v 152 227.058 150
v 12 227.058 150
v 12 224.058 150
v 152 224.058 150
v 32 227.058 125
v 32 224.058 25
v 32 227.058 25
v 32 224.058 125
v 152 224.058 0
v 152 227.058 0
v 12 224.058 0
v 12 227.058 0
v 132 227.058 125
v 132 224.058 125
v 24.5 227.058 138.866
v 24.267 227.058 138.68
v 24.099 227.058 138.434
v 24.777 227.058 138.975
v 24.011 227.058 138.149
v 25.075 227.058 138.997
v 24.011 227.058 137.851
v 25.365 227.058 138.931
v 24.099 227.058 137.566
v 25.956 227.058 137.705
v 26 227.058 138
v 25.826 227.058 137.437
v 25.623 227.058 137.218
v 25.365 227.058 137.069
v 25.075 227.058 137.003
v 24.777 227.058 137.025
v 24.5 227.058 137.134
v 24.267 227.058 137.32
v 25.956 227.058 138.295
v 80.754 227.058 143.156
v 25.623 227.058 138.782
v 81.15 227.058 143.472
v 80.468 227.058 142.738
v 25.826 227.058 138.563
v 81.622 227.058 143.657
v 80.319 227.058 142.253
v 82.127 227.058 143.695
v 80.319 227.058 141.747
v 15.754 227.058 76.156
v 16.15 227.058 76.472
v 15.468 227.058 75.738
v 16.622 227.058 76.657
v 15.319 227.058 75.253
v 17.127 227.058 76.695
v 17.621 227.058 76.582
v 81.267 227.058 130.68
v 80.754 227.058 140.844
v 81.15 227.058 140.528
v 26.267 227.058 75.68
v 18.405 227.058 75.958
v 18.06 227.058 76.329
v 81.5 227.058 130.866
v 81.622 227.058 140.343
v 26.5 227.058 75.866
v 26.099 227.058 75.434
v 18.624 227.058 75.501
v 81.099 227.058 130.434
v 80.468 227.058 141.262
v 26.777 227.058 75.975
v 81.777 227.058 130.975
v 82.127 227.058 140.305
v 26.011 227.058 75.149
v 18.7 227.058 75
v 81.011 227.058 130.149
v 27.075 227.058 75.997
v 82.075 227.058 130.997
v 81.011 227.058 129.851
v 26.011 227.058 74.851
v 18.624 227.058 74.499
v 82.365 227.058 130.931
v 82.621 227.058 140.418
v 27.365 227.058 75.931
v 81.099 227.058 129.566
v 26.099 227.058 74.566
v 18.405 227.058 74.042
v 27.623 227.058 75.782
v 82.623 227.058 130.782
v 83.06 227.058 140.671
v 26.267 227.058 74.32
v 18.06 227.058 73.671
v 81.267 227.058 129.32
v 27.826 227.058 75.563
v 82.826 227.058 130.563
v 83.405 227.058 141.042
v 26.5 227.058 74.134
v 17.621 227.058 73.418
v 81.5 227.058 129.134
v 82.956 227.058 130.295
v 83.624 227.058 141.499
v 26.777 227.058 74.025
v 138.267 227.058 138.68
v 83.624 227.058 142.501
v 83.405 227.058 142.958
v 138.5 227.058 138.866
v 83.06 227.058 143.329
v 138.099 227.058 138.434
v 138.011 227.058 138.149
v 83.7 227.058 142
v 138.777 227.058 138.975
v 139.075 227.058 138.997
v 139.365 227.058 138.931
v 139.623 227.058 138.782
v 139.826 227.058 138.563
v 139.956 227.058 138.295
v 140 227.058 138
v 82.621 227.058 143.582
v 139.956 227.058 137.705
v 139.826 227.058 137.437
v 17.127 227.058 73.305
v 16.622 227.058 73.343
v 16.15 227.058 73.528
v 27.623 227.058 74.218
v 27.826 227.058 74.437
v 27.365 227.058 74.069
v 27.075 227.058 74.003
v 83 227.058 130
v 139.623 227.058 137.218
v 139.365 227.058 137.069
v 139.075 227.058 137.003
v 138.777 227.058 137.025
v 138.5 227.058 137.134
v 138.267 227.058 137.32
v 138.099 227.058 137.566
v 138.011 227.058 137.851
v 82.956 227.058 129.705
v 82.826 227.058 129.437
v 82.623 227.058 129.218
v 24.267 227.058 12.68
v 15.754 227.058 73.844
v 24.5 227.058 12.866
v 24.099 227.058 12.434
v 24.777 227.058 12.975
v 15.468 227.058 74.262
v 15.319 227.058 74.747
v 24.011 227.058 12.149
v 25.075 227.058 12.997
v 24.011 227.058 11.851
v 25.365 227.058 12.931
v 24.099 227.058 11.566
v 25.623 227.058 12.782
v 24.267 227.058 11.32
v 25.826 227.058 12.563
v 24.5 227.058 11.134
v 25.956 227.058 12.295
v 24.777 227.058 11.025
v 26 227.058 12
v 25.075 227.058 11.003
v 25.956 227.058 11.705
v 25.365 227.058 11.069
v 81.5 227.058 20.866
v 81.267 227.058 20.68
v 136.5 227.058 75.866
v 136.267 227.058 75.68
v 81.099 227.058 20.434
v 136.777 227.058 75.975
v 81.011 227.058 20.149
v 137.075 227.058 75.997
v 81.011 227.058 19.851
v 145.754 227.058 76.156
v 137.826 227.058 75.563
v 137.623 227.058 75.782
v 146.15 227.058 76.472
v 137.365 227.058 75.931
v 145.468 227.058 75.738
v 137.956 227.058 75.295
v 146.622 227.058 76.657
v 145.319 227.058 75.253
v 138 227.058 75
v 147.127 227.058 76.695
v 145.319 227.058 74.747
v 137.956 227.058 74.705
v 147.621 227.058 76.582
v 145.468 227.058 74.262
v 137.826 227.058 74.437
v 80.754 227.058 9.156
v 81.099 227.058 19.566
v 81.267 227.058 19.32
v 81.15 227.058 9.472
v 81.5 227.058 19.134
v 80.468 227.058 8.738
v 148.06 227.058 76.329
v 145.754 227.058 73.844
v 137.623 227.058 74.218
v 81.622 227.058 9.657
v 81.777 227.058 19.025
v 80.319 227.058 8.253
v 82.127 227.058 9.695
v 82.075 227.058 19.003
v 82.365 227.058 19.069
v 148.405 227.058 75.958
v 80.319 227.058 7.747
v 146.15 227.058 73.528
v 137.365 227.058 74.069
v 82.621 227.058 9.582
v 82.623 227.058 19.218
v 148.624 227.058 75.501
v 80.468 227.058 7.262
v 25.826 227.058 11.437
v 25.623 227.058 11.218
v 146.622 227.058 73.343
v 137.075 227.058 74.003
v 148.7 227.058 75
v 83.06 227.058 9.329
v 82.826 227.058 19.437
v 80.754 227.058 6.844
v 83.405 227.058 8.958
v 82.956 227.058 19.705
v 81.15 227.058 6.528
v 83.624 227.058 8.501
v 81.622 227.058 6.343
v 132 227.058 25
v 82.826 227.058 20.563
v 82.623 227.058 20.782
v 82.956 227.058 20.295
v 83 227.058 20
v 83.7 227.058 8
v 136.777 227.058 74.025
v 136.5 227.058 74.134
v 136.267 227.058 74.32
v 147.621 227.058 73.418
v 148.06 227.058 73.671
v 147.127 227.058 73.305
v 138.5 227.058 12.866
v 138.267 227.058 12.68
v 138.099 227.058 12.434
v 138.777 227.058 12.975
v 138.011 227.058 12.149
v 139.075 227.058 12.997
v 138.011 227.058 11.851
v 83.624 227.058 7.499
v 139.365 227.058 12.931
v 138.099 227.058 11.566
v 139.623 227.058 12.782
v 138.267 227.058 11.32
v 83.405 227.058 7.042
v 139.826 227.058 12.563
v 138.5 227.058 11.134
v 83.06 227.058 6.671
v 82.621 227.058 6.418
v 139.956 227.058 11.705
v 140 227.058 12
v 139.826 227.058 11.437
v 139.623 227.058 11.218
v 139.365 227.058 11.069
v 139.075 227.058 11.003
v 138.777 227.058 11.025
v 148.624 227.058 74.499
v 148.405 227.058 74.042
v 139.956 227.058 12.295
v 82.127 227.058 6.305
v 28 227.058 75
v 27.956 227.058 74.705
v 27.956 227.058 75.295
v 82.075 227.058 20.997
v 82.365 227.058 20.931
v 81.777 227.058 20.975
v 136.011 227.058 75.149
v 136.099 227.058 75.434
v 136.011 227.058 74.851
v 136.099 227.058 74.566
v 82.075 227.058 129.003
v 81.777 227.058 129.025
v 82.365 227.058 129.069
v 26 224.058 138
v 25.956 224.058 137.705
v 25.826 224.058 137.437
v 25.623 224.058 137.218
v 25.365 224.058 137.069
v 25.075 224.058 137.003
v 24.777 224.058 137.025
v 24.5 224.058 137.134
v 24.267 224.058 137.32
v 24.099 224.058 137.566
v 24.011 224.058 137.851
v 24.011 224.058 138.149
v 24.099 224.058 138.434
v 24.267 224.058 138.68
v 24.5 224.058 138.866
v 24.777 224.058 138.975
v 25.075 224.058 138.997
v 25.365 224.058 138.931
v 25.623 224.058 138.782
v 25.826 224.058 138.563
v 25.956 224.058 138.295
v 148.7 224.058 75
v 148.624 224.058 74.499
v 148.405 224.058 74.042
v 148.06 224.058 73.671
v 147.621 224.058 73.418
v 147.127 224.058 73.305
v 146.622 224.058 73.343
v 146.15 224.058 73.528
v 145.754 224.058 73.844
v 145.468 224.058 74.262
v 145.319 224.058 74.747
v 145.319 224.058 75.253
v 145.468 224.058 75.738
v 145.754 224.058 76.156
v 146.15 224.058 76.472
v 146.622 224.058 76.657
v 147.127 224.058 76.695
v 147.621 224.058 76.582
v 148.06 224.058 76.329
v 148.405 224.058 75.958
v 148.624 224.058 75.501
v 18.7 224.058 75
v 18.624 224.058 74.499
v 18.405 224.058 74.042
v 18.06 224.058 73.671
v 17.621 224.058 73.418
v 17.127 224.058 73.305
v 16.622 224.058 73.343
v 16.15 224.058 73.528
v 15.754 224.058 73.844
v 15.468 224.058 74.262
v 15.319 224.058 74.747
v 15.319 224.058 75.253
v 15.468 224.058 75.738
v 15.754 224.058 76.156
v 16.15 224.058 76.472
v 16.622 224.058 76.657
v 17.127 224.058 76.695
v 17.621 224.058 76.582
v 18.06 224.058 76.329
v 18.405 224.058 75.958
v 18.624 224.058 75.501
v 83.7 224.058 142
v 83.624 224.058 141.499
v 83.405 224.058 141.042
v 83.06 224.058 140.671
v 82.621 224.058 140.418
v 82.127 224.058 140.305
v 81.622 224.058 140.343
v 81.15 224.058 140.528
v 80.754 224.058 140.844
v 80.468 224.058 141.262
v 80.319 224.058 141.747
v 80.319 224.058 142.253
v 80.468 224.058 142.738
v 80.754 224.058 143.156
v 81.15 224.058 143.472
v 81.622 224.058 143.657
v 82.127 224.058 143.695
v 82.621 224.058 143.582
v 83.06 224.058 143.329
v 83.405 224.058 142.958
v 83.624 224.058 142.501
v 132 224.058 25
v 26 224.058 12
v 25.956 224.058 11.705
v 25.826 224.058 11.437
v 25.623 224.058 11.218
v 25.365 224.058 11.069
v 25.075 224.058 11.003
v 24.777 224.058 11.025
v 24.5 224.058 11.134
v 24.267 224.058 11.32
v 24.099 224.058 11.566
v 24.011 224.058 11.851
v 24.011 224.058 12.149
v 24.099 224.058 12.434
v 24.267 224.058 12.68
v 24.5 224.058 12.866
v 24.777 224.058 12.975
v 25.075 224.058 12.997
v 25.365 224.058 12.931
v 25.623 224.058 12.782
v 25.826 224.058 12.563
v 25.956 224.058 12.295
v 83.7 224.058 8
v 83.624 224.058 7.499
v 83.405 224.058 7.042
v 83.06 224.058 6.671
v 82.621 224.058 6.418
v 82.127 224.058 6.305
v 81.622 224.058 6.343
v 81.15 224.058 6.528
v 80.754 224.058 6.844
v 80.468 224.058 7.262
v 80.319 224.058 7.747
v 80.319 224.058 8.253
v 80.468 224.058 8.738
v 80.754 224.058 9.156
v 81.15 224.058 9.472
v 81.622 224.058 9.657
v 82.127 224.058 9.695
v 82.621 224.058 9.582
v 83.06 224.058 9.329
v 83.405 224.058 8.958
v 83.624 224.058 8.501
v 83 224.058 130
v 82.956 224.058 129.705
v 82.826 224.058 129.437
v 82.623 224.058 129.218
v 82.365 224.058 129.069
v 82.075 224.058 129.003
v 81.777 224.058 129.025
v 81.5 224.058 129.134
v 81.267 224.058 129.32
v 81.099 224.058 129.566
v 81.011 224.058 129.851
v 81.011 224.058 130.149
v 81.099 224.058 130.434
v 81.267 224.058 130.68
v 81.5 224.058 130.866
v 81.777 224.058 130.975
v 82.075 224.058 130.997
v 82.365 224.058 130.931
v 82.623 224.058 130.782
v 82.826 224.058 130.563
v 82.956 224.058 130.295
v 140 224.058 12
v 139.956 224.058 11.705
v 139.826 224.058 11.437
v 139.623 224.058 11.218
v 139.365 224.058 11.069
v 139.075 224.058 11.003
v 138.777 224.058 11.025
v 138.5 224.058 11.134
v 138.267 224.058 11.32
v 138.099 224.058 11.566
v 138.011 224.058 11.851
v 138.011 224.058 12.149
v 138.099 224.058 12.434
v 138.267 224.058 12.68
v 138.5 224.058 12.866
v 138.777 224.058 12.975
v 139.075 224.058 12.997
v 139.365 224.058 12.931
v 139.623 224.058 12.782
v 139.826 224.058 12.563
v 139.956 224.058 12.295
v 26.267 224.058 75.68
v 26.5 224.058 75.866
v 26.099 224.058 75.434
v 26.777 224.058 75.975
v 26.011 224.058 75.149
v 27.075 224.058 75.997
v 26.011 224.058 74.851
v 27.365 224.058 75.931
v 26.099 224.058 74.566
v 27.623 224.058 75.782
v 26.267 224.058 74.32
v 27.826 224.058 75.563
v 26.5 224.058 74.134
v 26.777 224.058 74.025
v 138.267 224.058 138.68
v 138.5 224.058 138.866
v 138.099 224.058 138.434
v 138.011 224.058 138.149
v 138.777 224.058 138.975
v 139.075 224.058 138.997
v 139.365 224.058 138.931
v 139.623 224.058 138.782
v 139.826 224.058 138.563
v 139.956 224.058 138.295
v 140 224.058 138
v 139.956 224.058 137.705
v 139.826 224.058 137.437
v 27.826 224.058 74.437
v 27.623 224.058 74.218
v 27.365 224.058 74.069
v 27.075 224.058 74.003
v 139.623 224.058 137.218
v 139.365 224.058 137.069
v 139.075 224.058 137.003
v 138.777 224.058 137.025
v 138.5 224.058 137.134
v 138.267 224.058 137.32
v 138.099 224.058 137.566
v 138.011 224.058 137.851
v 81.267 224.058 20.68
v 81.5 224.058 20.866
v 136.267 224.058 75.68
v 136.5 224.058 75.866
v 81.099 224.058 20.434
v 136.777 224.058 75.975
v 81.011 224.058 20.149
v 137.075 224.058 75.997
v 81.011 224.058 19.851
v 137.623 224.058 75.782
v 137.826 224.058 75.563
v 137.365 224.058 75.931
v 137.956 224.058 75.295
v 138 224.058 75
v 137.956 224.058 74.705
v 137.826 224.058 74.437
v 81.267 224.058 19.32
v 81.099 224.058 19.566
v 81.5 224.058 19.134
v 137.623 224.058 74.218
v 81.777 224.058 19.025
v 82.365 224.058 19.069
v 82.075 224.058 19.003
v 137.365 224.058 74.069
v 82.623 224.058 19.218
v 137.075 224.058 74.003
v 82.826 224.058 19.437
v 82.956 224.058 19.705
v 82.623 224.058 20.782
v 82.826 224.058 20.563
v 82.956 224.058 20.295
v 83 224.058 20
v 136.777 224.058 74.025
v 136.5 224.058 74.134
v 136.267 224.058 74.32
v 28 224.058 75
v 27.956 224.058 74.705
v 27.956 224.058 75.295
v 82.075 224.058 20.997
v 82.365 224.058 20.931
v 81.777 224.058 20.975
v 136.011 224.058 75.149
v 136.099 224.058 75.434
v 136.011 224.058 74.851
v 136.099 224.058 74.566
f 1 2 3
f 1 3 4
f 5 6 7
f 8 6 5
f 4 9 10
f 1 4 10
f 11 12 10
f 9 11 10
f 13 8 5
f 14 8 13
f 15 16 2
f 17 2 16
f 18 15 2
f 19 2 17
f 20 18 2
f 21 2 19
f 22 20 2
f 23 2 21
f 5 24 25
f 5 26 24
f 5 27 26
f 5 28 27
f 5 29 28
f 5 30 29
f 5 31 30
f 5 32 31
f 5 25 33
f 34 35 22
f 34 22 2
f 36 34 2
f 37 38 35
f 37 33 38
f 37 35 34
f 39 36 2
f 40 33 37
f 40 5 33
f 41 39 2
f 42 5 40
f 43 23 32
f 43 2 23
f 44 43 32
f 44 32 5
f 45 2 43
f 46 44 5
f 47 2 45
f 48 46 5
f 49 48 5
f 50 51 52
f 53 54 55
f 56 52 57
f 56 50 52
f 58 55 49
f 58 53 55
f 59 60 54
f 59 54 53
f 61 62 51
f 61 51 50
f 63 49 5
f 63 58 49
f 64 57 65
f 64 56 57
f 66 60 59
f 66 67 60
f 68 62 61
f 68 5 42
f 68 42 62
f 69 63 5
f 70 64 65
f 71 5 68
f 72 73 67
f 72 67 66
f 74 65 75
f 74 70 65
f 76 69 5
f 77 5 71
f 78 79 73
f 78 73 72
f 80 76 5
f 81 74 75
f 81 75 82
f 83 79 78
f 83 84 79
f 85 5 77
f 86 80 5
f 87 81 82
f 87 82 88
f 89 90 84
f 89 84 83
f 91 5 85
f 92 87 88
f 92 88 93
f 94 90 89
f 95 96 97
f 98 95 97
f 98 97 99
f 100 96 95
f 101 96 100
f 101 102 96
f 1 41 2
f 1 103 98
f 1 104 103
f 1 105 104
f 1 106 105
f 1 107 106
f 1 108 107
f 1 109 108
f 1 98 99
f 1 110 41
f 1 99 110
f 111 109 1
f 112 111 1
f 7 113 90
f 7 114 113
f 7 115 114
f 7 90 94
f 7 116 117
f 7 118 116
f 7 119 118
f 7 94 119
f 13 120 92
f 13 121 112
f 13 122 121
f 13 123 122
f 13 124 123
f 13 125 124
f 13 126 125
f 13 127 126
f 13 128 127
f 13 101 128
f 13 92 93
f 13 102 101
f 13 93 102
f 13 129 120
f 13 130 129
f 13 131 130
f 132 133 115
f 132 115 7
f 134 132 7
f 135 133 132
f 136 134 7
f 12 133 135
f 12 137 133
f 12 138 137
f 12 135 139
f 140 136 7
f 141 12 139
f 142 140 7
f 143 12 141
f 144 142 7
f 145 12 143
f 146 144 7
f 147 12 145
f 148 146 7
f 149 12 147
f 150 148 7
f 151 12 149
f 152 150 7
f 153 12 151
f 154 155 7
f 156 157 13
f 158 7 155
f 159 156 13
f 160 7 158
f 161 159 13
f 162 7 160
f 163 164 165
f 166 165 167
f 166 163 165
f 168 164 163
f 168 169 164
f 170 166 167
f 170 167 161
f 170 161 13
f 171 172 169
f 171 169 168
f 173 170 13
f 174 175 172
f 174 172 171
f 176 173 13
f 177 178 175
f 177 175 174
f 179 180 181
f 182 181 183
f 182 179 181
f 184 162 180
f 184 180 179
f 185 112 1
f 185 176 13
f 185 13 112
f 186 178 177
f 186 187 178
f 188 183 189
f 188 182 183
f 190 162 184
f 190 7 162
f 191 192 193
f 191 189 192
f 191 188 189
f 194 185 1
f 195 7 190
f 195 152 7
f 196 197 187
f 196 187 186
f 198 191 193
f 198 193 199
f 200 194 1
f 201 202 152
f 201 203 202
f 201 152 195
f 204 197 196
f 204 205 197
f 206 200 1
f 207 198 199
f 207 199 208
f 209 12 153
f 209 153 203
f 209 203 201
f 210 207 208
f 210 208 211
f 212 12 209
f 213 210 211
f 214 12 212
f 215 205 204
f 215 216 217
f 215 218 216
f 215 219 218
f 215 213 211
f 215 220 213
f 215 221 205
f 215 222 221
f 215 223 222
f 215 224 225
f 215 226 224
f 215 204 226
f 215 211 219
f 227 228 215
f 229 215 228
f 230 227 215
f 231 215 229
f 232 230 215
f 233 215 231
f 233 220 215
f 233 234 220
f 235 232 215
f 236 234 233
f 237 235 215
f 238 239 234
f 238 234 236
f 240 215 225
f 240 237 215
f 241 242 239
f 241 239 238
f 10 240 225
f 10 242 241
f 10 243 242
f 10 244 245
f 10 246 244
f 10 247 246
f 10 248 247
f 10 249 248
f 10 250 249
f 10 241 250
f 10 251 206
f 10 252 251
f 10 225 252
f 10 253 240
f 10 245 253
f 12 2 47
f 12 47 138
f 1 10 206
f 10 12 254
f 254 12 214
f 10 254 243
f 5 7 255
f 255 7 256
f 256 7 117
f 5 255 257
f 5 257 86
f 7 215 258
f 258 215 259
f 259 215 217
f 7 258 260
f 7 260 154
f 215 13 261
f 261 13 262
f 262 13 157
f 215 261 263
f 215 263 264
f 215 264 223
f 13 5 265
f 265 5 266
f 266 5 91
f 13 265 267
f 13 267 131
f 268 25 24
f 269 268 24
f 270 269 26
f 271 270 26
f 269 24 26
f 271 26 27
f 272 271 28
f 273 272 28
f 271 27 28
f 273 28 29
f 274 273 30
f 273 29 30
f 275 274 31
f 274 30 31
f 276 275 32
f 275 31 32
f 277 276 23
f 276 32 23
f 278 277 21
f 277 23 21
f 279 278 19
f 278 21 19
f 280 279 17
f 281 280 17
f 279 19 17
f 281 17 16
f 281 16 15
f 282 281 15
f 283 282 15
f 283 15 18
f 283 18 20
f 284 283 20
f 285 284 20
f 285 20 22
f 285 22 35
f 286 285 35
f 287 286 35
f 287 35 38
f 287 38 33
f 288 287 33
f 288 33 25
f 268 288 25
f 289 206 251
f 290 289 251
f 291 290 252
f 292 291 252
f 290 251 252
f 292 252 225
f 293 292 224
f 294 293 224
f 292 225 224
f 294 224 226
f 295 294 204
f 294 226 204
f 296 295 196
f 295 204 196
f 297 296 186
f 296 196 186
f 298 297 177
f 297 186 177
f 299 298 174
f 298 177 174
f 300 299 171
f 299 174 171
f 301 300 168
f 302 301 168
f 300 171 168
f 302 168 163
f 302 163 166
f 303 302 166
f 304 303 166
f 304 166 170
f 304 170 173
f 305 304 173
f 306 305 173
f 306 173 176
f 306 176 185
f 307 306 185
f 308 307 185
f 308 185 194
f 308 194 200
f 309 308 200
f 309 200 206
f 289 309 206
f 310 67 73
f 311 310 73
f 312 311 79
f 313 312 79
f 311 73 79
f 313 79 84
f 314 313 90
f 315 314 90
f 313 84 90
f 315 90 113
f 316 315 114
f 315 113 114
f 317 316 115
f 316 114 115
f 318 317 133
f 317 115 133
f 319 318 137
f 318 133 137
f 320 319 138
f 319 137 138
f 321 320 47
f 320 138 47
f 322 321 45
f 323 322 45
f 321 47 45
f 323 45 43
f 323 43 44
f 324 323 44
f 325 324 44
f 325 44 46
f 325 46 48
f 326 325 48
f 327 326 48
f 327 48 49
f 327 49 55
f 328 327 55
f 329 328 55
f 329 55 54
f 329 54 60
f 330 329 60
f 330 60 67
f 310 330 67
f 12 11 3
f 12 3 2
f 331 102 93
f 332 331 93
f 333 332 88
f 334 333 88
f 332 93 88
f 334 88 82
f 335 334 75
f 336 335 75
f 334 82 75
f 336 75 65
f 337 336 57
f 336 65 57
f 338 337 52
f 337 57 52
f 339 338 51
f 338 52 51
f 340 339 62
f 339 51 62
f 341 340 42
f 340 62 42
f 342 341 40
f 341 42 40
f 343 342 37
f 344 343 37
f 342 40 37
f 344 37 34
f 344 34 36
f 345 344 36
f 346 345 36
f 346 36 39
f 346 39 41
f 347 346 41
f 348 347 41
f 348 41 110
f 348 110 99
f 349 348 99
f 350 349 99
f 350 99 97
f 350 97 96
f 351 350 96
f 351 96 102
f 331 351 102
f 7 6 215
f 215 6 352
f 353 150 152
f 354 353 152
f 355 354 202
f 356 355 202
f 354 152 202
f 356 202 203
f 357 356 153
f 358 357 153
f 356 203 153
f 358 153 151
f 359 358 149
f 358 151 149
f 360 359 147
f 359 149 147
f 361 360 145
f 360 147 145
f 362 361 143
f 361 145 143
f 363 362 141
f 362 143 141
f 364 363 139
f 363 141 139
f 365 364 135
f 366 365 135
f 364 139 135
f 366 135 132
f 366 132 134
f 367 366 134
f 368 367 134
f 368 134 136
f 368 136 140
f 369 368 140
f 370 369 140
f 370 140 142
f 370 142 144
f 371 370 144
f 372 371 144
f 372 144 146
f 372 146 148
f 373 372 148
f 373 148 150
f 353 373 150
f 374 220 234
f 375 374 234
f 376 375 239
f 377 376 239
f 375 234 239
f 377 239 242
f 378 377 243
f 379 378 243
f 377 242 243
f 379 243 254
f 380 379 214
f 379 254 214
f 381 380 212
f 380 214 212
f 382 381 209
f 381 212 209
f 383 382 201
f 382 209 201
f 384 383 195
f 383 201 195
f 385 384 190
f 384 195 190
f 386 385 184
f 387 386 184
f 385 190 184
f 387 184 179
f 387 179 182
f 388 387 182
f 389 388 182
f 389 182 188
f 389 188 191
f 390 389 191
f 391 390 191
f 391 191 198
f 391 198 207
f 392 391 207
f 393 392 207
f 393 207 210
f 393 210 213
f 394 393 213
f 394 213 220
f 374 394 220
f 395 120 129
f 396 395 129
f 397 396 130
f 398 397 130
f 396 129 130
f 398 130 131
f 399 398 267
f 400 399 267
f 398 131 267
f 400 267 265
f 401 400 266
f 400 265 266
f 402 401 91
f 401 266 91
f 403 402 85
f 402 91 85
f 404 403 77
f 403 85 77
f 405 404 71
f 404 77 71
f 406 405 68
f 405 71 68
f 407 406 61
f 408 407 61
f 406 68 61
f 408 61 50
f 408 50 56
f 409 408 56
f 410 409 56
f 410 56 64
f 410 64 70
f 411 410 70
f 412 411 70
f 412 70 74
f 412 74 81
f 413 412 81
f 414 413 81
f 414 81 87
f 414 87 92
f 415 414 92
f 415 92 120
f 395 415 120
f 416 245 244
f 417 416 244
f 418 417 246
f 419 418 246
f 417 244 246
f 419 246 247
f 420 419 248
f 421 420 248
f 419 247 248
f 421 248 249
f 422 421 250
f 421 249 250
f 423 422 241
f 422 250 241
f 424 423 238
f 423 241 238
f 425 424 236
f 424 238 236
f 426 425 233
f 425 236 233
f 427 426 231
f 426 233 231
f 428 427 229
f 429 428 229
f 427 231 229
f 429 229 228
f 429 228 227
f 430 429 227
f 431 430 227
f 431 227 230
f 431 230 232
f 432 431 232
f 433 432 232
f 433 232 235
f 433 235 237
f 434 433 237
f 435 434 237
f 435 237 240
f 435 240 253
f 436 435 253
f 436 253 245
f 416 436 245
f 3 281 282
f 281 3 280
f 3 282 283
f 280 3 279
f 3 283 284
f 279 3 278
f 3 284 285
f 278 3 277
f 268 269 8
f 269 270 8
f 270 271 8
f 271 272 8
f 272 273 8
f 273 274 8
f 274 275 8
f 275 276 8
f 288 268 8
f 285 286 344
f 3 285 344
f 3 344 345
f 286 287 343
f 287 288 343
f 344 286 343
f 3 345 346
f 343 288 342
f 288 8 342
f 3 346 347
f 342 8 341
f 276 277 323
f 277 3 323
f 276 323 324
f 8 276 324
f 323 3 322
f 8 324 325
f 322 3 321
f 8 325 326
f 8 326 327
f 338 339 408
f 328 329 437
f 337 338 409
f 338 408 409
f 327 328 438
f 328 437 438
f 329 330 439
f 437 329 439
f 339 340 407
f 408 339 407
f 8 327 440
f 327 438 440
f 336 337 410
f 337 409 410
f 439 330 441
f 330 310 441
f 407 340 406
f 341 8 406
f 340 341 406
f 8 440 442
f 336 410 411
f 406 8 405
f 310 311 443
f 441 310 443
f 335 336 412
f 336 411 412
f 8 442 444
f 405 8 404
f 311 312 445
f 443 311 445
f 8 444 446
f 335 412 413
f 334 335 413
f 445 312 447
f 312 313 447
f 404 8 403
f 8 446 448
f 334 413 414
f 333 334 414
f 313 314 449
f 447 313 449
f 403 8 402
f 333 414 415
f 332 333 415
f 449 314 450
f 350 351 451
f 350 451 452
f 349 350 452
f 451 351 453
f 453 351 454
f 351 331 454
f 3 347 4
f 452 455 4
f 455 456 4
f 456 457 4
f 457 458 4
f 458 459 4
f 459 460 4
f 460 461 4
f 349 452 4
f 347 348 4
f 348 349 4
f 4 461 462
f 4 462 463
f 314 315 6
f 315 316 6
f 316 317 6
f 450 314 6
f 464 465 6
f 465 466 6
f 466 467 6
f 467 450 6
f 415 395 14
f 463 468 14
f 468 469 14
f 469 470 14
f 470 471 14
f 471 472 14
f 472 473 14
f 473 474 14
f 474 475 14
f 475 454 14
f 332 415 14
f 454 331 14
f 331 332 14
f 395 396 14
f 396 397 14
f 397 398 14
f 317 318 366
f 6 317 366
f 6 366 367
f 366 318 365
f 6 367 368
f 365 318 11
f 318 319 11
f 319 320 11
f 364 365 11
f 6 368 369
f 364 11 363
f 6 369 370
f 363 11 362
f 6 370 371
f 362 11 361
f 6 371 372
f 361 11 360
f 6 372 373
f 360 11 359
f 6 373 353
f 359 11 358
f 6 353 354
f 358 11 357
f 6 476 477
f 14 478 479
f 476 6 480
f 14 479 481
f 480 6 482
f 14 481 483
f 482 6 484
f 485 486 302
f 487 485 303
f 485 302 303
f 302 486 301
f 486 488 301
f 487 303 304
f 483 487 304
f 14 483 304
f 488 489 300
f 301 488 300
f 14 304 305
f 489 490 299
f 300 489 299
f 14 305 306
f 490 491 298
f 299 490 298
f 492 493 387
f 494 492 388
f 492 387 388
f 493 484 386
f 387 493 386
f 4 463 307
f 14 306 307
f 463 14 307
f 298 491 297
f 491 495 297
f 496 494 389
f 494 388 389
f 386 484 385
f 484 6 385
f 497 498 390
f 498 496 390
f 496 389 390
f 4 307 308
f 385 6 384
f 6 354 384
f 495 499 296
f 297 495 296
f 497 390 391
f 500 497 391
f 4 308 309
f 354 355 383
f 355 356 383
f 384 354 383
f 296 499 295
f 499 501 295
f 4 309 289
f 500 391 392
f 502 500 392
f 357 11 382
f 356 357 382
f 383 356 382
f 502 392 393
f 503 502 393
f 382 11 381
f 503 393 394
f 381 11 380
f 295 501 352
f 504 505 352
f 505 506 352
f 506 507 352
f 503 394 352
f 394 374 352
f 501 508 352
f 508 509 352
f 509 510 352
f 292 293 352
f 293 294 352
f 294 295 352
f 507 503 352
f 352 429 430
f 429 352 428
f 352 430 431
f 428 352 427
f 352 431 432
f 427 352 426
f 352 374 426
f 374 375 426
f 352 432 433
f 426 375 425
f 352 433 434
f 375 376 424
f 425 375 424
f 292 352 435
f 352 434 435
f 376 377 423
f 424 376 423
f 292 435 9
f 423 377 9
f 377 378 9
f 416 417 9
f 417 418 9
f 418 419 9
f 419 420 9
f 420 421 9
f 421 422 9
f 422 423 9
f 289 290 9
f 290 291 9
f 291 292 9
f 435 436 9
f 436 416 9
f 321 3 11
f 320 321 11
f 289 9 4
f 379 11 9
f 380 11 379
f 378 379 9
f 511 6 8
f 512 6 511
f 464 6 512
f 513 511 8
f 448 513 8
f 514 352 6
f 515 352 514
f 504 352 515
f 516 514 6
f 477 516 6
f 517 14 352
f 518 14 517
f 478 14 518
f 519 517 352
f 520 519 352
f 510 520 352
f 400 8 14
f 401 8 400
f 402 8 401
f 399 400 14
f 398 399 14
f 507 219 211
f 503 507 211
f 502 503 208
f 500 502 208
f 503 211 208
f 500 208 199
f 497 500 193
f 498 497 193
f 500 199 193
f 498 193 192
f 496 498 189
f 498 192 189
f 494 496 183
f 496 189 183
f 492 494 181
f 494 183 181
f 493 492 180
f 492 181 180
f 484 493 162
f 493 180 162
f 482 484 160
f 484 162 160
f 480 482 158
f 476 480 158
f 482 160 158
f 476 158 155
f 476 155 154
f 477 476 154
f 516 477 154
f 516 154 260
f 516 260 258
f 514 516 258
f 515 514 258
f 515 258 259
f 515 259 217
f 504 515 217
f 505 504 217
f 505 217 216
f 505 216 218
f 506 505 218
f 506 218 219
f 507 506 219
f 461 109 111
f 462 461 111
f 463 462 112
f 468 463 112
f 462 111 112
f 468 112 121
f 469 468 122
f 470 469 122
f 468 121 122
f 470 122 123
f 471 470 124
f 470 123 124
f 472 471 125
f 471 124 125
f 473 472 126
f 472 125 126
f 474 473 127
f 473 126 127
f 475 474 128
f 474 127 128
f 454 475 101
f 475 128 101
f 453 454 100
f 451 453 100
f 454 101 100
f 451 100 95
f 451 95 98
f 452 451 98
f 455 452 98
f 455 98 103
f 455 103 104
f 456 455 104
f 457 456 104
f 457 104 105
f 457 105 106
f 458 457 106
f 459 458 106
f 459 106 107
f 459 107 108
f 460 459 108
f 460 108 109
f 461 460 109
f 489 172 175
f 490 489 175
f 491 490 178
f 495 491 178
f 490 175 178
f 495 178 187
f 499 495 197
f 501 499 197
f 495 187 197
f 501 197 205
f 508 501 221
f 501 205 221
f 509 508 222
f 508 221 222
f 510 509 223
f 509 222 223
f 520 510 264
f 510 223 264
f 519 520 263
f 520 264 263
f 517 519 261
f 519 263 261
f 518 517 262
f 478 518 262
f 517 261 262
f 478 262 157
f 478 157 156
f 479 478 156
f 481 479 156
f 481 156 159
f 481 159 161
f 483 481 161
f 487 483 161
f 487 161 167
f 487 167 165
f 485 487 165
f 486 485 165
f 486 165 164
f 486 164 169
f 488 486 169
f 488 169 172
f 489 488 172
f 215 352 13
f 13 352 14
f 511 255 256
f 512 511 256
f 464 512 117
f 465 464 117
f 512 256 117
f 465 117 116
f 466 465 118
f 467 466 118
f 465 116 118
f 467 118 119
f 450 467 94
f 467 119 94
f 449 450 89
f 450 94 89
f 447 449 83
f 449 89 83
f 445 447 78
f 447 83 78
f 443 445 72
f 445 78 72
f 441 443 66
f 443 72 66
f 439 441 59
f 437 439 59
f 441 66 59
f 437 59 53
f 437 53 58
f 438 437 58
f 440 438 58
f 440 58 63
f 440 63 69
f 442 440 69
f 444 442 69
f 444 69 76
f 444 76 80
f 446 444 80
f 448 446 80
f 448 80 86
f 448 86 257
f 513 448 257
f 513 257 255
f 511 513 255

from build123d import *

# Parameters (mm, degrees)
SKETCH_1_W           = 140
SKETCH_1_H           = 3
EXTRUDE_1_DEPTH      = 150
CUT_EXTRUDE_1_REACH  = 5
SKETCH_2_W           = 100
SKETCH_2_H           = 100
HOLE_WIZARD_M3_1_D   = 3.4
HOLE_WIZARD_M3_1_2_D = 2


with BuildPart() as part:
    # 草图1 → 拉伸-薄壁1 (new body)
    with BuildSketch(Plane.XY):
        with Locations((82, 225.557982809)):
            Rectangle(SKETCH_1_W, SKETCH_1_H)
    extrude(amount=EXTRUDE_1_DEPTH)

    # 草图2 → 切除-拉伸1 (cut, up to next)
    with BuildSketch(Plane.XZ.offset(-224.057982809), mode=Mode.PRIVATE) as cut_extrude_1_sk1:
        with Locations((82, 75)):
            Rectangle(SKETCH_2_W, SKETCH_2_H)
    cut_extrude_1_tool1 = extrude(cut_extrude_1_sk1.sketch, amount=-CUT_EXTRUDE_1_REACH, mode=Mode.PRIVATE) & part.part
    add(cut_extrude_1_tool1.solids().sort_by_distance((82, 224.057983, 75))[0], mode=Mode.SUBTRACT)

    # Hole Wizard M3 _1 (through all)
    with Locations(Plane(origin=(0, 224.057982809, 0), x_dir=(-1, 0, 0), z_dir=(0, -1, 0))):
        with Locations((-82, -142), (-147, -75), (-82, -8), (-17, -75)):
            Hole(HOLE_WIZARD_M3_1_D / 2)

    # Hole Wizard M3 _1 2 (through all)
    with Locations(Plane(origin=(0, 224.057982809, 0), x_dir=(-1, 0, 0), z_dir=(0, -1, 0))):
        with Locations((-139, -138), (-25, -138), (-82, -130), (-27, -75), (-137, -75), (-82, -20), (-25, -12), (-139, -12)):
            Hole(HOLE_WIZARD_M3_1_2_D / 2)


solid = part.part
